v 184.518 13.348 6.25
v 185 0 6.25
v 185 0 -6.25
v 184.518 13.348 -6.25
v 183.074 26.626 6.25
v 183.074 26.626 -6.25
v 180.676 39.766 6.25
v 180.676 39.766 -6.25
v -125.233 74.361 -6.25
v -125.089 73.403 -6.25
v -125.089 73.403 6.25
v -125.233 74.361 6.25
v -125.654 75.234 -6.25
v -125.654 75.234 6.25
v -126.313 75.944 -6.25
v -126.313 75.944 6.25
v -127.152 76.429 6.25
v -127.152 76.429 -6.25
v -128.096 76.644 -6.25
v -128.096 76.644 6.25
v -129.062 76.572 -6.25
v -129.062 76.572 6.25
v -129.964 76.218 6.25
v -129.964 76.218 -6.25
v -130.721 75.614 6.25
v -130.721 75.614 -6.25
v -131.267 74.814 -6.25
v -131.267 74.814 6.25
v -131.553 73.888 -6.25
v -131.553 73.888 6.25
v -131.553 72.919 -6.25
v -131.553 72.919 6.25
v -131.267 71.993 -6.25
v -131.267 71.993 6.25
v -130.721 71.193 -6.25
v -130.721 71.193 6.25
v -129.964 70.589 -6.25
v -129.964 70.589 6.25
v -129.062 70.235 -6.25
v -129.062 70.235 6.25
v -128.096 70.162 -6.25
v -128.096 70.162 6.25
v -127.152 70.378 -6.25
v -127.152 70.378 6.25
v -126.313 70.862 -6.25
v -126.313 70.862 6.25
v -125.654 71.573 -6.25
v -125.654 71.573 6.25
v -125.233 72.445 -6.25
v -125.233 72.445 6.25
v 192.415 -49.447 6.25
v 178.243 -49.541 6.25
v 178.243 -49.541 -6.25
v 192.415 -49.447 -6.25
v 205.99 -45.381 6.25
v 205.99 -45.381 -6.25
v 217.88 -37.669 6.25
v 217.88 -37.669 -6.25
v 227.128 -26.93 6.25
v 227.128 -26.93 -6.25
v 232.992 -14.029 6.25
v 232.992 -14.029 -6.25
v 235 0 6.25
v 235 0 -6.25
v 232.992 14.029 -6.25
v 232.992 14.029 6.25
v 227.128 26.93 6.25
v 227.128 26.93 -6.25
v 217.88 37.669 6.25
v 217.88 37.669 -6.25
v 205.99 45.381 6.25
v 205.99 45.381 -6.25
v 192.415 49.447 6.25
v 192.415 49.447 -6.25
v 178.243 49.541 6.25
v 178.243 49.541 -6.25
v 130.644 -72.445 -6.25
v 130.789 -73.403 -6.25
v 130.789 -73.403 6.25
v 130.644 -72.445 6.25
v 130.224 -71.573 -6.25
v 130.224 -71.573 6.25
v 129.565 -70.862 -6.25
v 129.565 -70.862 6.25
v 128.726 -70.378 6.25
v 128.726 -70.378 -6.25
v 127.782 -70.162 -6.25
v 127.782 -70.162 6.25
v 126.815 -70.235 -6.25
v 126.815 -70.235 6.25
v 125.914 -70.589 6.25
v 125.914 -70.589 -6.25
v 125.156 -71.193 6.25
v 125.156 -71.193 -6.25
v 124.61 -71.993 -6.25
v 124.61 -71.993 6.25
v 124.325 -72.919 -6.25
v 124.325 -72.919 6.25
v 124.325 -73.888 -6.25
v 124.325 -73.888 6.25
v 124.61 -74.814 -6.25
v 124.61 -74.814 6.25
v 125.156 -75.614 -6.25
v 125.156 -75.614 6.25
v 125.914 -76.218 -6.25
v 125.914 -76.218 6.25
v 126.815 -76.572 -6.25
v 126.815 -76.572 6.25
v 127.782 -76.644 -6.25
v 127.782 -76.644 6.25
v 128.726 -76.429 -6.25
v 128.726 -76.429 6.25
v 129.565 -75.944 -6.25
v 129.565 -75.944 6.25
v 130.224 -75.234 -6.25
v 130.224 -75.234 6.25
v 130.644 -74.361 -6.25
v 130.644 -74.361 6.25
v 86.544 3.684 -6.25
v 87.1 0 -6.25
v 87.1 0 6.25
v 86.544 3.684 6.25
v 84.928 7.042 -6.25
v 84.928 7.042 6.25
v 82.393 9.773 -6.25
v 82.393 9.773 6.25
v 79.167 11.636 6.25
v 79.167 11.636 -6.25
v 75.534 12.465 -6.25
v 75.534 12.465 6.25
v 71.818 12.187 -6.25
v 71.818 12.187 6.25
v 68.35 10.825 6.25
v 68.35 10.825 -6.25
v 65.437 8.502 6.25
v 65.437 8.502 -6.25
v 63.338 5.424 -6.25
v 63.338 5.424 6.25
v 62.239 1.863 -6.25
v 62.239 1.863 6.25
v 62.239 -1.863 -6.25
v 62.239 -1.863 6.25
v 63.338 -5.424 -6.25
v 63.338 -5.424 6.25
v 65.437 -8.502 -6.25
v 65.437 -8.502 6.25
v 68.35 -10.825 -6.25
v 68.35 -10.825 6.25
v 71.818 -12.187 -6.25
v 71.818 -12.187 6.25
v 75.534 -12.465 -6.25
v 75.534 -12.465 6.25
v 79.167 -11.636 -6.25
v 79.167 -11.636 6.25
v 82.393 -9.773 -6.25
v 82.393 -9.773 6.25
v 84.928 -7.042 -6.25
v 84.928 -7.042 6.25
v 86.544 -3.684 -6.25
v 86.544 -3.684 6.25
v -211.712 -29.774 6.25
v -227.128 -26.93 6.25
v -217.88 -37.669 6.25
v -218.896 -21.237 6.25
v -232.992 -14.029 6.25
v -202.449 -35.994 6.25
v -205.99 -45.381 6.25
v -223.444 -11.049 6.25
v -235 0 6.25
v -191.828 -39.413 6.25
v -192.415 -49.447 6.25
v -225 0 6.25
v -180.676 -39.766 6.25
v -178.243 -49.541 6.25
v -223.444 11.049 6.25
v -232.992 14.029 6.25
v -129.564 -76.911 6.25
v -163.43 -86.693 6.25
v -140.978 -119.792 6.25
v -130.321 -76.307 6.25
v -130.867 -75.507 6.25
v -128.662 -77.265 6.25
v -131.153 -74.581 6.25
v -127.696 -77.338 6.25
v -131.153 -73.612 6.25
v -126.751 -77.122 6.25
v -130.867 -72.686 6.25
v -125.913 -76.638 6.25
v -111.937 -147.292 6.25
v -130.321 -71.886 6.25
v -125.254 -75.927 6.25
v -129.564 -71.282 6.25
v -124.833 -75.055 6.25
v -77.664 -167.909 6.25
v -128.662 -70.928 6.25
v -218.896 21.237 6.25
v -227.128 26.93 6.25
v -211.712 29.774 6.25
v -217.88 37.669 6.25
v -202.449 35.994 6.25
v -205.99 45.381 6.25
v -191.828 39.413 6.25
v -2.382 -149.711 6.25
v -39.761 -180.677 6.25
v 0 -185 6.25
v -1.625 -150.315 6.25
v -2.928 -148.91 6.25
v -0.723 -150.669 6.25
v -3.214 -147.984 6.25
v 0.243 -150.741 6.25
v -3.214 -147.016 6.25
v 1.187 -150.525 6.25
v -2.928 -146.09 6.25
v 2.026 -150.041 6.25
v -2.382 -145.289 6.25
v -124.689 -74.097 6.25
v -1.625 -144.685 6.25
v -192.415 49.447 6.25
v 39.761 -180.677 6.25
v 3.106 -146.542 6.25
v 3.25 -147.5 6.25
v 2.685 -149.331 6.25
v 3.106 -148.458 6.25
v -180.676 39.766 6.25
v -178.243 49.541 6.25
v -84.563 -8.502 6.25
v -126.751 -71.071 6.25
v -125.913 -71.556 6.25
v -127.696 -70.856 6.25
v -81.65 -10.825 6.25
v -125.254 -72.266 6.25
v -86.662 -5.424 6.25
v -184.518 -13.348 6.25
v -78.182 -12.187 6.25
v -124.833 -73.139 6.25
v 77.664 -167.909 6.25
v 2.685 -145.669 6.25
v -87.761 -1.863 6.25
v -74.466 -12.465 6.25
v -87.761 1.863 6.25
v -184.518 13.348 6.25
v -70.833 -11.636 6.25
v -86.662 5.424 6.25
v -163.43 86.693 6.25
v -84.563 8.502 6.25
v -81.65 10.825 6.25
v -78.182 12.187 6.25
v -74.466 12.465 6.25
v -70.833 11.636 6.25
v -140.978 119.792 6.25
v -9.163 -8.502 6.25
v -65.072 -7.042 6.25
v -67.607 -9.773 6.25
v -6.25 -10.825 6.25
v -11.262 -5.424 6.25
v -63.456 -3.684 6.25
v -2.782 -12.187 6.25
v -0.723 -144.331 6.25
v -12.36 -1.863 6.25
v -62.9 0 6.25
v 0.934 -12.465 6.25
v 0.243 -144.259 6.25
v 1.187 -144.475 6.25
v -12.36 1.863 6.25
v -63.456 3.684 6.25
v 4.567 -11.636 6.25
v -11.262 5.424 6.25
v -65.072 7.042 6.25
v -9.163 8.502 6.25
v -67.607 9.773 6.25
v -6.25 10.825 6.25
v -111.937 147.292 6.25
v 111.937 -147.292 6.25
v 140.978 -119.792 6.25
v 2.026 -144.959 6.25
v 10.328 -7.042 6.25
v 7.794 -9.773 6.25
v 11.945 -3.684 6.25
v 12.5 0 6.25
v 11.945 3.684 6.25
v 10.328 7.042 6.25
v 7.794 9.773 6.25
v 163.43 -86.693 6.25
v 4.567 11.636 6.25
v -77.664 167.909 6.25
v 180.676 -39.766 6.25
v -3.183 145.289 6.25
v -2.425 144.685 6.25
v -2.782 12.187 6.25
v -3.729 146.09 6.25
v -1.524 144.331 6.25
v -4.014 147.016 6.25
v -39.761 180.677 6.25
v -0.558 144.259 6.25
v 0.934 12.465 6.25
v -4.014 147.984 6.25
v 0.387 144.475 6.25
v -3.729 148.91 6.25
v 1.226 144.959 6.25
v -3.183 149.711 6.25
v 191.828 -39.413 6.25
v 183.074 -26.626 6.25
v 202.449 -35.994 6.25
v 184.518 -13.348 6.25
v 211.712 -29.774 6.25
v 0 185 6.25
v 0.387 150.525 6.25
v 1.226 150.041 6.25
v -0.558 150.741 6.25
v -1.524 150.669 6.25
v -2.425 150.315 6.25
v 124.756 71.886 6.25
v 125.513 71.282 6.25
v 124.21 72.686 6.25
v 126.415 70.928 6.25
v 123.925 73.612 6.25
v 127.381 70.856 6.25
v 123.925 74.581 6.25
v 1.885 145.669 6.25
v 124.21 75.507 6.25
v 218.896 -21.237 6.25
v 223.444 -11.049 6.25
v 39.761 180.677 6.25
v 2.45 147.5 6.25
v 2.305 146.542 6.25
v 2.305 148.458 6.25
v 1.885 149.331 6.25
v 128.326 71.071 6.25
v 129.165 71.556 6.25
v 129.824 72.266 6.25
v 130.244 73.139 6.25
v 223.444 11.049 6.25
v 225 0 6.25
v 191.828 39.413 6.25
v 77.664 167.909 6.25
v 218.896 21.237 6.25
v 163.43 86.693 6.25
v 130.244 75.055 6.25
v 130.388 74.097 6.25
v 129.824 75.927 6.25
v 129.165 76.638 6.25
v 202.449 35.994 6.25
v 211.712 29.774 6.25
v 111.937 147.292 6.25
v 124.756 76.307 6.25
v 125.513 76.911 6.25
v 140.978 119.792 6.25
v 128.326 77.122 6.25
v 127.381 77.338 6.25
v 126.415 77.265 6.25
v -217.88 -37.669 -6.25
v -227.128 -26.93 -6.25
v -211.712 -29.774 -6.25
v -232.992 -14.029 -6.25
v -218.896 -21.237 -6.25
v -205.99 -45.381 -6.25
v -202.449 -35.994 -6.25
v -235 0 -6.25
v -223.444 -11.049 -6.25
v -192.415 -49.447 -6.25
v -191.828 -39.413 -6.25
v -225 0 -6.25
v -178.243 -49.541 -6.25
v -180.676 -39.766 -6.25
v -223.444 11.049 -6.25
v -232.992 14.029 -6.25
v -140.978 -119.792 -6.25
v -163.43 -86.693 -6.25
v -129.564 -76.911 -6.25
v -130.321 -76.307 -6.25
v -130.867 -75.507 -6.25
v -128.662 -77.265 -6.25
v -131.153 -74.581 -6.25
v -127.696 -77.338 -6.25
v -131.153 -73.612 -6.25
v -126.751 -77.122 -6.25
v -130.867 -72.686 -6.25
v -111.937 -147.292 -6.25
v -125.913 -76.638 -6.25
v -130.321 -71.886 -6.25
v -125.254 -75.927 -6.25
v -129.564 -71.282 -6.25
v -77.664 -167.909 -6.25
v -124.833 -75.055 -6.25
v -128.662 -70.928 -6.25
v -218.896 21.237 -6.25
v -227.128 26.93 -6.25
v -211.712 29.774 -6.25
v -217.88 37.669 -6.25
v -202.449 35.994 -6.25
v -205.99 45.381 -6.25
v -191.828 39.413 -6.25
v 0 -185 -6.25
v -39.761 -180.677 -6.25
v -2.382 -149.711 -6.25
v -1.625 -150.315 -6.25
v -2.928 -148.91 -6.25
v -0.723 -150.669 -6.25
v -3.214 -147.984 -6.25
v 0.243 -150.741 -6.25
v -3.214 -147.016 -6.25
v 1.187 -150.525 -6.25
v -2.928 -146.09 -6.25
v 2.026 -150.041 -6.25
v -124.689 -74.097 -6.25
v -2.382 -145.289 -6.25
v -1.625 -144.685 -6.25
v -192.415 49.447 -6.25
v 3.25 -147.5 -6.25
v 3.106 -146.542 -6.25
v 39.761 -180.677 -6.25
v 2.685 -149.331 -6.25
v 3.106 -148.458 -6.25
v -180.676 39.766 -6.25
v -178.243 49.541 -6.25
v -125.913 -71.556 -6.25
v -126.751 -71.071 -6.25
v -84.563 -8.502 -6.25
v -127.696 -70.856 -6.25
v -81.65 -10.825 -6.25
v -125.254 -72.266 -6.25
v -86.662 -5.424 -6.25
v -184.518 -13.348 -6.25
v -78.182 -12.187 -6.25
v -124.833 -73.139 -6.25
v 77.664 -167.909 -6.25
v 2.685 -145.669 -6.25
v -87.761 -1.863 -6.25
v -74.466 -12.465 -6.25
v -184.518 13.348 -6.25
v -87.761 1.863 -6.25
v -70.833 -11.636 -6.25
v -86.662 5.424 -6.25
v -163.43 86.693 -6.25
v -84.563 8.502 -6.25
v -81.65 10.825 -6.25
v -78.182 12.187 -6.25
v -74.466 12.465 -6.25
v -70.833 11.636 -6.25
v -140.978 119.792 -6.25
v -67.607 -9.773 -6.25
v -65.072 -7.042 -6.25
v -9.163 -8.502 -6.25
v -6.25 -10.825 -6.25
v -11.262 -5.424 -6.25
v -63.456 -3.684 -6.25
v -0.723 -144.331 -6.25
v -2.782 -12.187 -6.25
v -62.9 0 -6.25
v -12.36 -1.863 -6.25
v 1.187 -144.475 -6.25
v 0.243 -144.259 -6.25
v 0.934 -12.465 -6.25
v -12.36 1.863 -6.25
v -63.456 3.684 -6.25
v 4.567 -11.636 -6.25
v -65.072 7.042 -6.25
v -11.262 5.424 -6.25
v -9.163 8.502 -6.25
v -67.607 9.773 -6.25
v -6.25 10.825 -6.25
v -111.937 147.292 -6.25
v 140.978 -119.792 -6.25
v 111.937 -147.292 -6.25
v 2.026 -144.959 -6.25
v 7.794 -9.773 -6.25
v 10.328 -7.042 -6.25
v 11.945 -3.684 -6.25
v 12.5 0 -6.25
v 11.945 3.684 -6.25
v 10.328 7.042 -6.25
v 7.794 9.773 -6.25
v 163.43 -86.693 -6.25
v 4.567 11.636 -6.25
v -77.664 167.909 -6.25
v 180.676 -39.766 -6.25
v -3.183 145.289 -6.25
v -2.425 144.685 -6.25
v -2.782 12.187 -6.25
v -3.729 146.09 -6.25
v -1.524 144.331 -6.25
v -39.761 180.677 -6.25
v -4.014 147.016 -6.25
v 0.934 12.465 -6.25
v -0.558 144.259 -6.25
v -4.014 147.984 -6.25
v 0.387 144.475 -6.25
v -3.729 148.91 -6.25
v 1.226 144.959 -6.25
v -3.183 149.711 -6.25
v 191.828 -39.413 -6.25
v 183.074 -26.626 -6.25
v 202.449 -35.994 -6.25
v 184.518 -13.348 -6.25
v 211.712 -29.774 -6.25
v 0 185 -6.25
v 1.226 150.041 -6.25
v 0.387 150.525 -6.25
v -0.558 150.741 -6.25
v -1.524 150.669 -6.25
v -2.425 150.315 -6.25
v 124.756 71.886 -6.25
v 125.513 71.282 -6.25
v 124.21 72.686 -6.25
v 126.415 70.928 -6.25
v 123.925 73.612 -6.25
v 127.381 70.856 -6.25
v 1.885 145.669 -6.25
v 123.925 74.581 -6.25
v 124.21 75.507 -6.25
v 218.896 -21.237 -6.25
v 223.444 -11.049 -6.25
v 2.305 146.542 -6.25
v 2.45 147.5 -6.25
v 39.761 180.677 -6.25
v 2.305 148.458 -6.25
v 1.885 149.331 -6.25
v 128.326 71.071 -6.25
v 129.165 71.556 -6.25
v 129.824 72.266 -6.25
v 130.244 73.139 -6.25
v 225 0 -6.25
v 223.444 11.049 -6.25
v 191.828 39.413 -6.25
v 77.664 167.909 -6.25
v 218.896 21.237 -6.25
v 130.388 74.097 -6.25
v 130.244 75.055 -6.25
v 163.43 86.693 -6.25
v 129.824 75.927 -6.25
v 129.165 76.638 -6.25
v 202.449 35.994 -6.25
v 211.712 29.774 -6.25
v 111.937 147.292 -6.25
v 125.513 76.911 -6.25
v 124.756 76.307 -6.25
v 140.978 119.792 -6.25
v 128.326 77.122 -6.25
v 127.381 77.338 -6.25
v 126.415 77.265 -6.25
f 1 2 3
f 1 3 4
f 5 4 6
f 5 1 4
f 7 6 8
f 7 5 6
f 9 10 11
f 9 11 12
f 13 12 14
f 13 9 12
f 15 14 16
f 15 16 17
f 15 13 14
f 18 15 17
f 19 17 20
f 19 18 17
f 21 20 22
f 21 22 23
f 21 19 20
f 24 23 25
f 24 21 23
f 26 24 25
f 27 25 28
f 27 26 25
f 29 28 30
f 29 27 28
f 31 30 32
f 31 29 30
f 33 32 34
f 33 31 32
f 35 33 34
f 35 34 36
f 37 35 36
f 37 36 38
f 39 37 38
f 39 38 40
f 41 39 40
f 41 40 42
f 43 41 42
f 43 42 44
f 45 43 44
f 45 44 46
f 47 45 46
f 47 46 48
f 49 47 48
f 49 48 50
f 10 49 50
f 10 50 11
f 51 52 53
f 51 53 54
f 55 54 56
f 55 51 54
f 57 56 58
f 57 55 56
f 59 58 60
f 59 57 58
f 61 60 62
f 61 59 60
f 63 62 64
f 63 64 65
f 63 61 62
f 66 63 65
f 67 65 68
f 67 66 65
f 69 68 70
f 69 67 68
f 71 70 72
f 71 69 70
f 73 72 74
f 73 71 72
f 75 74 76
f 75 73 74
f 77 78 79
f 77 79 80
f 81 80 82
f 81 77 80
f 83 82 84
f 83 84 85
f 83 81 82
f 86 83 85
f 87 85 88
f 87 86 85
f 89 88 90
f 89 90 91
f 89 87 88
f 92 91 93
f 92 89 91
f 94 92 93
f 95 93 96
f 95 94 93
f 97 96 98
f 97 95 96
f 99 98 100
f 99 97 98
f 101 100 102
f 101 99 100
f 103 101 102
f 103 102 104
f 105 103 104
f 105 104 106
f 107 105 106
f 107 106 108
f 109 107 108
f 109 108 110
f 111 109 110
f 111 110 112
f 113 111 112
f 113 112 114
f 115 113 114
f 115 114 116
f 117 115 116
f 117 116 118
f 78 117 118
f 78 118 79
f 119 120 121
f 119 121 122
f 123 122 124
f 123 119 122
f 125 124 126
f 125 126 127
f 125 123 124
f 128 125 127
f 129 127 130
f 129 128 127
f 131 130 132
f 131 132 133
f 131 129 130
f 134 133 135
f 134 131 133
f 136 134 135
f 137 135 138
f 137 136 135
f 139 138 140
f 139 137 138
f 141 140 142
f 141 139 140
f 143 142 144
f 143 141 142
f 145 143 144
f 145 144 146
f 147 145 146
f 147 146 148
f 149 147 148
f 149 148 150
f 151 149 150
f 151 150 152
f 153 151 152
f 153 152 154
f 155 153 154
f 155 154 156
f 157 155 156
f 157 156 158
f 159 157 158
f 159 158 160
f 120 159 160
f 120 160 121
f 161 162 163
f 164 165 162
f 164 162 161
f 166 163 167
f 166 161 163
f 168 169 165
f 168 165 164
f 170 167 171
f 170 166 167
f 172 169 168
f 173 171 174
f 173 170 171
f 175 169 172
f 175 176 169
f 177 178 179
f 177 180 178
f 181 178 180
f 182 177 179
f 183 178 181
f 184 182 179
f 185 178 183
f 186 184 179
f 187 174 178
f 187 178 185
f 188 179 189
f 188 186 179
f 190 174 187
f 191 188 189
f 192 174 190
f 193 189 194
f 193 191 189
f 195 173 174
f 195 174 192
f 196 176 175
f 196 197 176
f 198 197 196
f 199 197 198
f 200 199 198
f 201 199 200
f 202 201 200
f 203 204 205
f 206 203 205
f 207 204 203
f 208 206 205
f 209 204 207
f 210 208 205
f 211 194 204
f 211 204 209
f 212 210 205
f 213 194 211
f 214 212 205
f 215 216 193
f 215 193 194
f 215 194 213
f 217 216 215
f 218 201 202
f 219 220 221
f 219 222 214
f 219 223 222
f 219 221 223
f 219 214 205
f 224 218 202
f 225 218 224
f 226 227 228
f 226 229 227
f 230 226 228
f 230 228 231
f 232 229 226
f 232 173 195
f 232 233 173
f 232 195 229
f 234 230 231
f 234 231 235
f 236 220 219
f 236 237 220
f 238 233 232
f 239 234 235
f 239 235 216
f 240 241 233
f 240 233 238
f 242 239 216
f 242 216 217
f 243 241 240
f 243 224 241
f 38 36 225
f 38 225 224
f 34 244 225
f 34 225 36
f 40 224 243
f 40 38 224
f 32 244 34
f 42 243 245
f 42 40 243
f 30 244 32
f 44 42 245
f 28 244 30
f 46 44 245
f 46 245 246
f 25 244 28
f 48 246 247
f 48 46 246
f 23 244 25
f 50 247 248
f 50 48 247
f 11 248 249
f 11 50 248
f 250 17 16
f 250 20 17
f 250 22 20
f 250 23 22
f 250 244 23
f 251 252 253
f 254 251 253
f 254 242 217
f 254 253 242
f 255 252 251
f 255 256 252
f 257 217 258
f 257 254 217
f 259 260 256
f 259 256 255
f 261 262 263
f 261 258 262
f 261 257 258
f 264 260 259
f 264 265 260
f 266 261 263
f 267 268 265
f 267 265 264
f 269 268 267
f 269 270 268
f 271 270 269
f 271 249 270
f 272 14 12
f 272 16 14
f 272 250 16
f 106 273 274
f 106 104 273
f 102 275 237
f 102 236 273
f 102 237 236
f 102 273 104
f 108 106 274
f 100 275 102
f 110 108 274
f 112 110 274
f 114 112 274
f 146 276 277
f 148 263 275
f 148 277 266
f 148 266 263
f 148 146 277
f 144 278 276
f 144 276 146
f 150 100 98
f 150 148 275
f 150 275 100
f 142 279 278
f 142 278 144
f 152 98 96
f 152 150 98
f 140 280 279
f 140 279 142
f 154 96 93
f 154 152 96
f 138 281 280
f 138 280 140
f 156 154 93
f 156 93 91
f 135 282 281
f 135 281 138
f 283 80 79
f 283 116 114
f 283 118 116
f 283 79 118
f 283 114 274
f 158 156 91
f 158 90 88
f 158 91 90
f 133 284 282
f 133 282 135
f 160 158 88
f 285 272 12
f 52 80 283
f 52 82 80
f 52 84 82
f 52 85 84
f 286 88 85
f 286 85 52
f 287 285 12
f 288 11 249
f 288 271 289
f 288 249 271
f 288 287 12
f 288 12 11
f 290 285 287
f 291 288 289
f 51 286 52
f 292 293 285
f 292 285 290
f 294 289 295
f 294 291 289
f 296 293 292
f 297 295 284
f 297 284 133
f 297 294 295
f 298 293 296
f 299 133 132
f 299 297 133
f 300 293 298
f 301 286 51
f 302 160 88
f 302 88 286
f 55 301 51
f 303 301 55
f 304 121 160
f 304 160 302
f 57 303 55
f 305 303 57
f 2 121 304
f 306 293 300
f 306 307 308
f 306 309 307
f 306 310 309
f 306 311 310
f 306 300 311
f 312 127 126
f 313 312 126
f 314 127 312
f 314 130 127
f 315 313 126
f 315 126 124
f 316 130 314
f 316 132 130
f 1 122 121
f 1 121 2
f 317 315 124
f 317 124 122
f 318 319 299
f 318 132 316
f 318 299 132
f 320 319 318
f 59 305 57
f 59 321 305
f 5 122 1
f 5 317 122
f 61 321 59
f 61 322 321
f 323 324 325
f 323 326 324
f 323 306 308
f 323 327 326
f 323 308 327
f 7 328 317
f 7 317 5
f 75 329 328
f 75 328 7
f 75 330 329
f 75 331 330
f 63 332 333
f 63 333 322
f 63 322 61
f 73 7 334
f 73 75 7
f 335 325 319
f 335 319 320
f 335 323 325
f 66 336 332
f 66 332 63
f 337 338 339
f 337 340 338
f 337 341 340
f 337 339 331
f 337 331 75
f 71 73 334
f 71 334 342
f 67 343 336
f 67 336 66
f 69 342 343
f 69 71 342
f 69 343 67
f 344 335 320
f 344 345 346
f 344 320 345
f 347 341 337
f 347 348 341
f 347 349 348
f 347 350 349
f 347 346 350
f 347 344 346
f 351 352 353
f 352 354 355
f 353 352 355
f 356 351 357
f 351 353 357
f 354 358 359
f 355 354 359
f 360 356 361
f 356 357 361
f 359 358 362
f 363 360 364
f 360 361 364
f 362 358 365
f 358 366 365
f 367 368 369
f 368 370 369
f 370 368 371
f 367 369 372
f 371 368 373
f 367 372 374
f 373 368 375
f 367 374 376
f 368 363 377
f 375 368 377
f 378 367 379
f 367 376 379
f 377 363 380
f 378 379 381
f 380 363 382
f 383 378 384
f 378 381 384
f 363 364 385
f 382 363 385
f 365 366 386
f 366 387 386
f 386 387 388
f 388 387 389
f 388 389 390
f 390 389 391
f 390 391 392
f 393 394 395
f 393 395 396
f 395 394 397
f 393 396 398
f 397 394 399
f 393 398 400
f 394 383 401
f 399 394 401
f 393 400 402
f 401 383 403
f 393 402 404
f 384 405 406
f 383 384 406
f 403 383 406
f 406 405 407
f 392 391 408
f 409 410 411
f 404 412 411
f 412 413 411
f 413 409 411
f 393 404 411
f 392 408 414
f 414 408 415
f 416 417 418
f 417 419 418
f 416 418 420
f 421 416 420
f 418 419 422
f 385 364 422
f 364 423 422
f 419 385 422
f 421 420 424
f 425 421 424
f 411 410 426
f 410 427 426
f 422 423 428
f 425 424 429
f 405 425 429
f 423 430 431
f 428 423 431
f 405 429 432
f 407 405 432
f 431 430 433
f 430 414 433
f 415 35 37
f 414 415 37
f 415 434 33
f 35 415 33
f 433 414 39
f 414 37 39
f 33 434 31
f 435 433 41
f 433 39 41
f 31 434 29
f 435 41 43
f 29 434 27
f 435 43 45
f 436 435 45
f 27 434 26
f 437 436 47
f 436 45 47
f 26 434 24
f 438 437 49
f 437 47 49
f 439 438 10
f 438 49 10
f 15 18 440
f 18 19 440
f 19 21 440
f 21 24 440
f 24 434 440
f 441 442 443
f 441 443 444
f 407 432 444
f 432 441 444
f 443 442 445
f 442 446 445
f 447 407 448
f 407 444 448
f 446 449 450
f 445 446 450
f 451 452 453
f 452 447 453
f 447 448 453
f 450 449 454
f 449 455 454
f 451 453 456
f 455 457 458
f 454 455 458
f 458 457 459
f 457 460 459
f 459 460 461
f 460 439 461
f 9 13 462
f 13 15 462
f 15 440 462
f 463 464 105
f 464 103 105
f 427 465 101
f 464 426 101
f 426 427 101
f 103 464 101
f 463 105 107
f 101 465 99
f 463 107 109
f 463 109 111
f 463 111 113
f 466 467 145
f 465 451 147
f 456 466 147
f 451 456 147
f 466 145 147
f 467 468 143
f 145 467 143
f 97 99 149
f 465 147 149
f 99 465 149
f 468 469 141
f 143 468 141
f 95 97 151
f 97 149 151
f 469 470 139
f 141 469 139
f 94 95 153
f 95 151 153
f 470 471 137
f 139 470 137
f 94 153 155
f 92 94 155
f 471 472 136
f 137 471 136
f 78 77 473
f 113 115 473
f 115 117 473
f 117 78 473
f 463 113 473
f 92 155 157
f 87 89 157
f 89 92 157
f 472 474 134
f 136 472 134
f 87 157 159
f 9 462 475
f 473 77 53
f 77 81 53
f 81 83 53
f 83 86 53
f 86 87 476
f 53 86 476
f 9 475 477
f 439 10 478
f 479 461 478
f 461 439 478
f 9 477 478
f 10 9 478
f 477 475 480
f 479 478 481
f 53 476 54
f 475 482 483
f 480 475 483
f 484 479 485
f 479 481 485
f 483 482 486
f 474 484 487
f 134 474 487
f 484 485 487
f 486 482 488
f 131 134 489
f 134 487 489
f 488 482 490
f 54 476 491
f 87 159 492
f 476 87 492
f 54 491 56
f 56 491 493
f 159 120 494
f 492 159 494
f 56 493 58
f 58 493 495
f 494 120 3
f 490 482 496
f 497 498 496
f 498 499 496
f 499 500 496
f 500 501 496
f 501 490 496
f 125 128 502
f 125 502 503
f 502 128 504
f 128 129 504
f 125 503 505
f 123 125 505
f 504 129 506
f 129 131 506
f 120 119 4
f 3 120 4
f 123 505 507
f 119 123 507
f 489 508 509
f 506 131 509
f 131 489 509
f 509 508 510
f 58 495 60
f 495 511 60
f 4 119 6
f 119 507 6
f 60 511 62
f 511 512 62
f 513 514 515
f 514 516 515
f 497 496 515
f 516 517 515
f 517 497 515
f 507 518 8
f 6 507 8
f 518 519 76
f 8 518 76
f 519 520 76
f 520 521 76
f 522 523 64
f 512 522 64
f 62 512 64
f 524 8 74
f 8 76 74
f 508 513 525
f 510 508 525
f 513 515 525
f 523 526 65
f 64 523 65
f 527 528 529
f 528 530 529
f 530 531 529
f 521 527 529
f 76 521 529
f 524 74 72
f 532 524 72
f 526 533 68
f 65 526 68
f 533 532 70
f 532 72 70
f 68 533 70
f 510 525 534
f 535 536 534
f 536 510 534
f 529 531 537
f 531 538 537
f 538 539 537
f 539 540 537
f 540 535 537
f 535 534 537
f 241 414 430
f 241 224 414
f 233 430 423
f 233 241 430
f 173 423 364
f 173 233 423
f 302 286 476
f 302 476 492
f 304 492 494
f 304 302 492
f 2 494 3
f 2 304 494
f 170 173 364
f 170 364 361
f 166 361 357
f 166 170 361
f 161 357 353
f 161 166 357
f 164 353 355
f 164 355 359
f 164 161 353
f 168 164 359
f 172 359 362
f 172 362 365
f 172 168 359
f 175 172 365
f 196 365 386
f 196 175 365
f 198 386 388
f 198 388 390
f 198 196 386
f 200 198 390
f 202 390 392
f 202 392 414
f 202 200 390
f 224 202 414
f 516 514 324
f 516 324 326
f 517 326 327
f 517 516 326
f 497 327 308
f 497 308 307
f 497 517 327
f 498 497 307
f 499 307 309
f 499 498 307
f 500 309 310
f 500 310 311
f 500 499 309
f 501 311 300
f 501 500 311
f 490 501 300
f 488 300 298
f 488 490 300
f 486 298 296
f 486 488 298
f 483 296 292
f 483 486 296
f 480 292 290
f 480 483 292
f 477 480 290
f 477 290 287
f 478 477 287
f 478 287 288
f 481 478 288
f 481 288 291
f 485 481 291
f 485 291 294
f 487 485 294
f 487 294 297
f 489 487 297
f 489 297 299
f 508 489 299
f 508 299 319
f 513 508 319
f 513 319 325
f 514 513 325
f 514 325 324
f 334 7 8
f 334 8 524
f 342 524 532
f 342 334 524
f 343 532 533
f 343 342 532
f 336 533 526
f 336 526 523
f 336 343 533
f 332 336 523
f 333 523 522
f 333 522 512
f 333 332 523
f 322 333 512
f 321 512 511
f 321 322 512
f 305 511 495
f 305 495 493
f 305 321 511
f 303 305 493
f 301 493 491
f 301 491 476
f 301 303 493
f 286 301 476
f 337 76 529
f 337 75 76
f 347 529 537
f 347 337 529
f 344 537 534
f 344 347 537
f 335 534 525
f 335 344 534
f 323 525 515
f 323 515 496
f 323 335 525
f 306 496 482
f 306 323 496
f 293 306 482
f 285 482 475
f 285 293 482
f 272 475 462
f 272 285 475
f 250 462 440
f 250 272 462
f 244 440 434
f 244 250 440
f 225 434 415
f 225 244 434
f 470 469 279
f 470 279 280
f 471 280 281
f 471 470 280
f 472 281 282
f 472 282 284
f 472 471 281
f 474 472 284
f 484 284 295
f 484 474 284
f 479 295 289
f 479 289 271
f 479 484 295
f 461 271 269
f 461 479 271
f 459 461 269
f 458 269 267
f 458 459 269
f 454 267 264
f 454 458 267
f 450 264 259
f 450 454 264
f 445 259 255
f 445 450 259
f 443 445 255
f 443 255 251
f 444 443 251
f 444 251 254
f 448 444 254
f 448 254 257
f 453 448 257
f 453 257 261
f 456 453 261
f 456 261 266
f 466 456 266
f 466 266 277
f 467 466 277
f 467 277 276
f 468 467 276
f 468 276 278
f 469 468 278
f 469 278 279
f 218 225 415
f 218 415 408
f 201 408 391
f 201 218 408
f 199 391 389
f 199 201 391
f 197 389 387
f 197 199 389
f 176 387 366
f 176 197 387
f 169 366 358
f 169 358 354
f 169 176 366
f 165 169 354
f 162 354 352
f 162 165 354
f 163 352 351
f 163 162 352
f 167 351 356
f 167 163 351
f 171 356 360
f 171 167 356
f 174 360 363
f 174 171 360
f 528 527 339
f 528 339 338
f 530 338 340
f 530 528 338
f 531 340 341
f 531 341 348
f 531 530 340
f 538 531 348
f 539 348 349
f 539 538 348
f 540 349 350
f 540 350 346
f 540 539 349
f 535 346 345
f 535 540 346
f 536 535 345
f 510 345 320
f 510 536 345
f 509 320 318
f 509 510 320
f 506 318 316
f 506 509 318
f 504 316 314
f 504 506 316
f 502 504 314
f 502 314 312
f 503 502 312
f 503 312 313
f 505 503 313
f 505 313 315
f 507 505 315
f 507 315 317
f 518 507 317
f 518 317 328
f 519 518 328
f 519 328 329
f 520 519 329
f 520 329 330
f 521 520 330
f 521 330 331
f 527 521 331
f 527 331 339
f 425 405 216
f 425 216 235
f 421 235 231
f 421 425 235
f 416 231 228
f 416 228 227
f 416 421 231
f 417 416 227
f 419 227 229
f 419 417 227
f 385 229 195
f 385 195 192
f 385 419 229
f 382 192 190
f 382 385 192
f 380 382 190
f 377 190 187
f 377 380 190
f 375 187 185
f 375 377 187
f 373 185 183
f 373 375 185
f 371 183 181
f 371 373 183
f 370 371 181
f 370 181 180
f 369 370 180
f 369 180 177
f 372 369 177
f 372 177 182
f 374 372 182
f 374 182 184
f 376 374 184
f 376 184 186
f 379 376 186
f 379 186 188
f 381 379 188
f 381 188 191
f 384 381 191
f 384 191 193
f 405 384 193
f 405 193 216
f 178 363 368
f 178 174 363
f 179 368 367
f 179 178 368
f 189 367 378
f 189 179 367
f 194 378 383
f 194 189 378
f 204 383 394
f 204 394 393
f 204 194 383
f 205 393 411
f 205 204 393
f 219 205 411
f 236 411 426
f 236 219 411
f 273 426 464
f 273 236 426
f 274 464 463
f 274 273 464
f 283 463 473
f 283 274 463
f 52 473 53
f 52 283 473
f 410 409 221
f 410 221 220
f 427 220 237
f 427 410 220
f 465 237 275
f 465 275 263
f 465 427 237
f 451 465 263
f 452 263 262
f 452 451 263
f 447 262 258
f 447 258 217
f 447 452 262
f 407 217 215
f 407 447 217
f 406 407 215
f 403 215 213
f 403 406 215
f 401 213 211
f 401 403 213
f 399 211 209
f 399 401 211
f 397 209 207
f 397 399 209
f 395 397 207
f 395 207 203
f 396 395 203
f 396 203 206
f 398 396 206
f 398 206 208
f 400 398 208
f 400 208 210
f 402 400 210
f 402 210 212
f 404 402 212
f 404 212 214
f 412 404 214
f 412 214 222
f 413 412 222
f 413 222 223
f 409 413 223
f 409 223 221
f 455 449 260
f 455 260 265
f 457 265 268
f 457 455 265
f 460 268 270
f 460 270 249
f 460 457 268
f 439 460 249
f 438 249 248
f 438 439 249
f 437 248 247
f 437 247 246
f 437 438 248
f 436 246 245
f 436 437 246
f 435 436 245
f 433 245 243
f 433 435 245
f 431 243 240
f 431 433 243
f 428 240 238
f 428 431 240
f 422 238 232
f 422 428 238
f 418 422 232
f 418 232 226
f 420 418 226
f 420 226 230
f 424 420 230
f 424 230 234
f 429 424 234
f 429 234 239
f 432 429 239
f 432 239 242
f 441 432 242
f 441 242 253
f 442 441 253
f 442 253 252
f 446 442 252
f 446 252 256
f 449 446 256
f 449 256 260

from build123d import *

# Parameters (mm, degrees)
F0_R     = 3.25
F0_R_2   = 12.5
F1_DEPTH = 6.25
F2_DEPTH = 5
F3_DEPTH = 6.25


with BuildPart() as f1:
    # F0 (on Top) → F1 (new body, symmetric)
    with BuildSketch(Plane.XY):
        with BuildLine():
            ThreePointArc((180.675676, -39.765566), (183.915742, -20), (185, 0))
            ThreePointArc((185, 0), (183.915742, 20), (180.675676, 39.765566))
            ThreePointArc((180.675676, 39.765566), (179.526012, 44.670022), (178.243243, 49.541359))
            ThreePointArc((178.243243, 49.541359), (0, 185), (-178.243243, 49.541359))
            ThreePointArc((-178.243243, 49.541359), (-179.526012, 44.670022), (-180.675676, 39.765566))
            ThreePointArc((-180.675676, 39.765566), (-185, 0), (-180.675676, -39.765566))
            ThreePointArc((-180.675676, -39.765566), (-179.526012, -44.670022), (-178.243243, -49.541359))
            ThreePointArc((-178.243243, -49.541359), (0, -185), (178.243243, -49.541359))
            ThreePointArc((178.243243, -49.541359), (179.526012, -44.670022), (180.675676, -39.765566))
        make_face()
        with Locations((-127.938853, -74.096593)):
            Circle(F0_R, mode=Mode.SUBTRACT)
        with Locations((0, -147.5)):
            Circle(F0_R, mode=Mode.SUBTRACT)
        with Locations((127.538642, -73.403407)):
            Circle(F0_R, mode=Mode.SUBTRACT)
        with Locations((-128.339063, 73.403407)):
            Circle(F0_R, mode=Mode.SUBTRACT)
        with Locations((-75.400211, 0)):
            Circle(F0_R_2, mode=Mode.SUBTRACT)
        with Locations((-0.800422, 147.5)):
            Circle(F0_R, mode=Mode.SUBTRACT)
        Circle(F0_R_2, mode=Mode.SUBTRACT)
        with Locations((74.599789, 0)):
            Circle(F0_R_2, mode=Mode.SUBTRACT)
        with Locations((127.138431, 74.096593)):
            Circle(F0_R, mode=Mode.SUBTRACT)
    extrude(amount=F1_DEPTH, both=True)

    # F0 (on Top) → F2 (join, symmetric)
    with BuildSketch(Plane.XY):
        with BuildLine():
            ThreePointArc((180.675676, -39.765566), (183.915742, -20), (185, 0))
            ThreePointArc((185, 0), (183.915742, 20), (180.675676, 39.765566))
            ThreePointArc((180.675676, 39.765566), (179.526012, 44.670022), (178.243243, 49.541359))
            ThreePointArc((178.243243, 49.541359), (0, 185), (-178.243243, 49.541359))
            ThreePointArc((-178.243243, 49.541359), (-179.526012, 44.670022), (-180.675676, 39.765566))
            ThreePointArc((-180.675676, 39.765566), (-185, 0), (-180.675676, -39.765566))
            ThreePointArc((-180.675676, -39.765566), (-179.526012, -44.670022), (-178.243243, -49.541359))
            ThreePointArc((-178.243243, -49.541359), (0, -185), (178.243243, -49.541359))
            ThreePointArc((178.243243, -49.541359), (179.526012, -44.670022), (180.675676, -39.765566))
        make_face()
        with Locations((-127.938853, -74.096593)):
            Circle(F0_R, mode=Mode.SUBTRACT)
        with Locations((0, -147.5)):
            Circle(F0_R, mode=Mode.SUBTRACT)
        with Locations((127.538642, -73.403407)):
            Circle(F0_R, mode=Mode.SUBTRACT)
        with Locations((-128.339063, 73.403407)):
            Circle(F0_R, mode=Mode.SUBTRACT)
        with Locations((-75.400211, 0)):
            Circle(F0_R_2, mode=Mode.SUBTRACT)
        with Locations((-0.800422, 147.5)):
            Circle(F0_R, mode=Mode.SUBTRACT)
        Circle(F0_R_2, mode=Mode.SUBTRACT)
        with Locations((74.599789, 0)):
            Circle(F0_R_2, mode=Mode.SUBTRACT)
        with Locations((127.138431, 74.096593)):
            Circle(F0_R, mode=Mode.SUBTRACT)
        with BuildLine():
            ThreePointArc((178.243243, 49.541359), (179.526012, 44.670022), (180.675676, 39.765566))
            ThreePointArc((180.675676, 39.765566), (225, 0), (180.675676, -39.765566))
            ThreePointArc((180.675676, -39.765566), (179.526012, -44.670022), (178.243243, -49.541359))
            ThreePointArc((178.243243, -49.541359), (235, 0), (178.243243, 49.541359))
        make_face()
        with BuildLine():
            ThreePointArc((-180.675676, 39.765566), (-179.526012, 44.670022), (-178.243243, 49.541359))
            ThreePointArc((-178.243243, 49.541359), (-235, 0), (-178.243243, -49.541359))
            ThreePointArc((-178.243243, -49.541359), (-179.526012, -44.670022), (-180.675676, -39.765566))
            ThreePointArc((-180.675676, -39.765566), (-225, 0), (-180.675676, 39.765566))
        make_face()
    extrude(amount=F2_DEPTH, both=True)

    # F0 (on Top) → F3 (join, symmetric)
    with BuildSketch(Plane.XY):
        with BuildLine():
            ThreePointArc((180.675676, -39.765566), (183.915742, -20), (185, 0))
            ThreePointArc((185, 0), (183.915742, 20), (180.675676, 39.765566))
            ThreePointArc((180.675676, 39.765566), (179.526012, 44.670022), (178.243243, 49.541359))
            ThreePointArc((178.243243, 49.541359), (0, 185), (-178.243243, 49.541359))
            ThreePointArc((-178.243243, 49.541359), (-179.526012, 44.670022), (-180.675676, 39.765566))
            ThreePointArc((-180.675676, 39.765566), (-185, 0), (-180.675676, -39.765566))
            ThreePointArc((-180.675676, -39.765566), (-179.526012, -44.670022), (-178.243243, -49.541359))
            ThreePointArc((-178.243243, -49.541359), (0, -185), (178.243243, -49.541359))
            ThreePointArc((178.243243, -49.541359), (179.526012, -44.670022), (180.675676, -39.765566))
        make_face()
        with Locations((-127.938853, -74.096593)):
            Circle(F0_R, mode=Mode.SUBTRACT)
        with Locations((0, -147.5)):
            Circle(F0_R, mode=Mode.SUBTRACT)
        with Locations((127.538642, -73.403407)):
            Circle(F0_R, mode=Mode.SUBTRACT)
        with Locations((-128.339063, 73.403407)):
            Circle(F0_R, mode=Mode.SUBTRACT)
        with Locations((-75.400211, 0)):
            Circle(F0_R_2, mode=Mode.SUBTRACT)
        with Locations((-0.800422, 147.5)):
            Circle(F0_R, mode=Mode.SUBTRACT)
        Circle(F0_R_2, mode=Mode.SUBTRACT)
        with Locations((74.599789, 0)):
            Circle(F0_R_2, mode=Mode.SUBTRACT)
        with Locations((127.138431, 74.096593)):
            Circle(F0_R, mode=Mode.SUBTRACT)
        with BuildLine():
            ThreePointArc((178.243243, 49.541359), (179.526012, 44.670022), (180.675676, 39.765566))
            ThreePointArc((180.675676, 39.765566), (225, 0), (180.675676, -39.765566))
            ThreePointArc((180.675676, -39.765566), (179.526012, -44.670022), (178.243243, -49.541359))
            ThreePointArc((178.243243, -49.541359), (235, 0), (178.243243, 49.541359))
        make_face()
        with BuildLine():
            ThreePointArc((-180.675676, 39.765566), (-179.526012, 44.670022), (-178.243243, 49.541359))
            ThreePointArc((-178.243243, 49.541359), (-235, 0), (-178.243243, -49.541359))
            ThreePointArc((-178.243243, -49.541359), (-179.526012, -44.670022), (-180.675676, -39.765566))
            ThreePointArc((-180.675676, -39.765566), (-225, 0), (-180.675676, 39.765566))
        make_face()
    extrude(amount=F3_DEPTH, both=True)


solid = f1.part
